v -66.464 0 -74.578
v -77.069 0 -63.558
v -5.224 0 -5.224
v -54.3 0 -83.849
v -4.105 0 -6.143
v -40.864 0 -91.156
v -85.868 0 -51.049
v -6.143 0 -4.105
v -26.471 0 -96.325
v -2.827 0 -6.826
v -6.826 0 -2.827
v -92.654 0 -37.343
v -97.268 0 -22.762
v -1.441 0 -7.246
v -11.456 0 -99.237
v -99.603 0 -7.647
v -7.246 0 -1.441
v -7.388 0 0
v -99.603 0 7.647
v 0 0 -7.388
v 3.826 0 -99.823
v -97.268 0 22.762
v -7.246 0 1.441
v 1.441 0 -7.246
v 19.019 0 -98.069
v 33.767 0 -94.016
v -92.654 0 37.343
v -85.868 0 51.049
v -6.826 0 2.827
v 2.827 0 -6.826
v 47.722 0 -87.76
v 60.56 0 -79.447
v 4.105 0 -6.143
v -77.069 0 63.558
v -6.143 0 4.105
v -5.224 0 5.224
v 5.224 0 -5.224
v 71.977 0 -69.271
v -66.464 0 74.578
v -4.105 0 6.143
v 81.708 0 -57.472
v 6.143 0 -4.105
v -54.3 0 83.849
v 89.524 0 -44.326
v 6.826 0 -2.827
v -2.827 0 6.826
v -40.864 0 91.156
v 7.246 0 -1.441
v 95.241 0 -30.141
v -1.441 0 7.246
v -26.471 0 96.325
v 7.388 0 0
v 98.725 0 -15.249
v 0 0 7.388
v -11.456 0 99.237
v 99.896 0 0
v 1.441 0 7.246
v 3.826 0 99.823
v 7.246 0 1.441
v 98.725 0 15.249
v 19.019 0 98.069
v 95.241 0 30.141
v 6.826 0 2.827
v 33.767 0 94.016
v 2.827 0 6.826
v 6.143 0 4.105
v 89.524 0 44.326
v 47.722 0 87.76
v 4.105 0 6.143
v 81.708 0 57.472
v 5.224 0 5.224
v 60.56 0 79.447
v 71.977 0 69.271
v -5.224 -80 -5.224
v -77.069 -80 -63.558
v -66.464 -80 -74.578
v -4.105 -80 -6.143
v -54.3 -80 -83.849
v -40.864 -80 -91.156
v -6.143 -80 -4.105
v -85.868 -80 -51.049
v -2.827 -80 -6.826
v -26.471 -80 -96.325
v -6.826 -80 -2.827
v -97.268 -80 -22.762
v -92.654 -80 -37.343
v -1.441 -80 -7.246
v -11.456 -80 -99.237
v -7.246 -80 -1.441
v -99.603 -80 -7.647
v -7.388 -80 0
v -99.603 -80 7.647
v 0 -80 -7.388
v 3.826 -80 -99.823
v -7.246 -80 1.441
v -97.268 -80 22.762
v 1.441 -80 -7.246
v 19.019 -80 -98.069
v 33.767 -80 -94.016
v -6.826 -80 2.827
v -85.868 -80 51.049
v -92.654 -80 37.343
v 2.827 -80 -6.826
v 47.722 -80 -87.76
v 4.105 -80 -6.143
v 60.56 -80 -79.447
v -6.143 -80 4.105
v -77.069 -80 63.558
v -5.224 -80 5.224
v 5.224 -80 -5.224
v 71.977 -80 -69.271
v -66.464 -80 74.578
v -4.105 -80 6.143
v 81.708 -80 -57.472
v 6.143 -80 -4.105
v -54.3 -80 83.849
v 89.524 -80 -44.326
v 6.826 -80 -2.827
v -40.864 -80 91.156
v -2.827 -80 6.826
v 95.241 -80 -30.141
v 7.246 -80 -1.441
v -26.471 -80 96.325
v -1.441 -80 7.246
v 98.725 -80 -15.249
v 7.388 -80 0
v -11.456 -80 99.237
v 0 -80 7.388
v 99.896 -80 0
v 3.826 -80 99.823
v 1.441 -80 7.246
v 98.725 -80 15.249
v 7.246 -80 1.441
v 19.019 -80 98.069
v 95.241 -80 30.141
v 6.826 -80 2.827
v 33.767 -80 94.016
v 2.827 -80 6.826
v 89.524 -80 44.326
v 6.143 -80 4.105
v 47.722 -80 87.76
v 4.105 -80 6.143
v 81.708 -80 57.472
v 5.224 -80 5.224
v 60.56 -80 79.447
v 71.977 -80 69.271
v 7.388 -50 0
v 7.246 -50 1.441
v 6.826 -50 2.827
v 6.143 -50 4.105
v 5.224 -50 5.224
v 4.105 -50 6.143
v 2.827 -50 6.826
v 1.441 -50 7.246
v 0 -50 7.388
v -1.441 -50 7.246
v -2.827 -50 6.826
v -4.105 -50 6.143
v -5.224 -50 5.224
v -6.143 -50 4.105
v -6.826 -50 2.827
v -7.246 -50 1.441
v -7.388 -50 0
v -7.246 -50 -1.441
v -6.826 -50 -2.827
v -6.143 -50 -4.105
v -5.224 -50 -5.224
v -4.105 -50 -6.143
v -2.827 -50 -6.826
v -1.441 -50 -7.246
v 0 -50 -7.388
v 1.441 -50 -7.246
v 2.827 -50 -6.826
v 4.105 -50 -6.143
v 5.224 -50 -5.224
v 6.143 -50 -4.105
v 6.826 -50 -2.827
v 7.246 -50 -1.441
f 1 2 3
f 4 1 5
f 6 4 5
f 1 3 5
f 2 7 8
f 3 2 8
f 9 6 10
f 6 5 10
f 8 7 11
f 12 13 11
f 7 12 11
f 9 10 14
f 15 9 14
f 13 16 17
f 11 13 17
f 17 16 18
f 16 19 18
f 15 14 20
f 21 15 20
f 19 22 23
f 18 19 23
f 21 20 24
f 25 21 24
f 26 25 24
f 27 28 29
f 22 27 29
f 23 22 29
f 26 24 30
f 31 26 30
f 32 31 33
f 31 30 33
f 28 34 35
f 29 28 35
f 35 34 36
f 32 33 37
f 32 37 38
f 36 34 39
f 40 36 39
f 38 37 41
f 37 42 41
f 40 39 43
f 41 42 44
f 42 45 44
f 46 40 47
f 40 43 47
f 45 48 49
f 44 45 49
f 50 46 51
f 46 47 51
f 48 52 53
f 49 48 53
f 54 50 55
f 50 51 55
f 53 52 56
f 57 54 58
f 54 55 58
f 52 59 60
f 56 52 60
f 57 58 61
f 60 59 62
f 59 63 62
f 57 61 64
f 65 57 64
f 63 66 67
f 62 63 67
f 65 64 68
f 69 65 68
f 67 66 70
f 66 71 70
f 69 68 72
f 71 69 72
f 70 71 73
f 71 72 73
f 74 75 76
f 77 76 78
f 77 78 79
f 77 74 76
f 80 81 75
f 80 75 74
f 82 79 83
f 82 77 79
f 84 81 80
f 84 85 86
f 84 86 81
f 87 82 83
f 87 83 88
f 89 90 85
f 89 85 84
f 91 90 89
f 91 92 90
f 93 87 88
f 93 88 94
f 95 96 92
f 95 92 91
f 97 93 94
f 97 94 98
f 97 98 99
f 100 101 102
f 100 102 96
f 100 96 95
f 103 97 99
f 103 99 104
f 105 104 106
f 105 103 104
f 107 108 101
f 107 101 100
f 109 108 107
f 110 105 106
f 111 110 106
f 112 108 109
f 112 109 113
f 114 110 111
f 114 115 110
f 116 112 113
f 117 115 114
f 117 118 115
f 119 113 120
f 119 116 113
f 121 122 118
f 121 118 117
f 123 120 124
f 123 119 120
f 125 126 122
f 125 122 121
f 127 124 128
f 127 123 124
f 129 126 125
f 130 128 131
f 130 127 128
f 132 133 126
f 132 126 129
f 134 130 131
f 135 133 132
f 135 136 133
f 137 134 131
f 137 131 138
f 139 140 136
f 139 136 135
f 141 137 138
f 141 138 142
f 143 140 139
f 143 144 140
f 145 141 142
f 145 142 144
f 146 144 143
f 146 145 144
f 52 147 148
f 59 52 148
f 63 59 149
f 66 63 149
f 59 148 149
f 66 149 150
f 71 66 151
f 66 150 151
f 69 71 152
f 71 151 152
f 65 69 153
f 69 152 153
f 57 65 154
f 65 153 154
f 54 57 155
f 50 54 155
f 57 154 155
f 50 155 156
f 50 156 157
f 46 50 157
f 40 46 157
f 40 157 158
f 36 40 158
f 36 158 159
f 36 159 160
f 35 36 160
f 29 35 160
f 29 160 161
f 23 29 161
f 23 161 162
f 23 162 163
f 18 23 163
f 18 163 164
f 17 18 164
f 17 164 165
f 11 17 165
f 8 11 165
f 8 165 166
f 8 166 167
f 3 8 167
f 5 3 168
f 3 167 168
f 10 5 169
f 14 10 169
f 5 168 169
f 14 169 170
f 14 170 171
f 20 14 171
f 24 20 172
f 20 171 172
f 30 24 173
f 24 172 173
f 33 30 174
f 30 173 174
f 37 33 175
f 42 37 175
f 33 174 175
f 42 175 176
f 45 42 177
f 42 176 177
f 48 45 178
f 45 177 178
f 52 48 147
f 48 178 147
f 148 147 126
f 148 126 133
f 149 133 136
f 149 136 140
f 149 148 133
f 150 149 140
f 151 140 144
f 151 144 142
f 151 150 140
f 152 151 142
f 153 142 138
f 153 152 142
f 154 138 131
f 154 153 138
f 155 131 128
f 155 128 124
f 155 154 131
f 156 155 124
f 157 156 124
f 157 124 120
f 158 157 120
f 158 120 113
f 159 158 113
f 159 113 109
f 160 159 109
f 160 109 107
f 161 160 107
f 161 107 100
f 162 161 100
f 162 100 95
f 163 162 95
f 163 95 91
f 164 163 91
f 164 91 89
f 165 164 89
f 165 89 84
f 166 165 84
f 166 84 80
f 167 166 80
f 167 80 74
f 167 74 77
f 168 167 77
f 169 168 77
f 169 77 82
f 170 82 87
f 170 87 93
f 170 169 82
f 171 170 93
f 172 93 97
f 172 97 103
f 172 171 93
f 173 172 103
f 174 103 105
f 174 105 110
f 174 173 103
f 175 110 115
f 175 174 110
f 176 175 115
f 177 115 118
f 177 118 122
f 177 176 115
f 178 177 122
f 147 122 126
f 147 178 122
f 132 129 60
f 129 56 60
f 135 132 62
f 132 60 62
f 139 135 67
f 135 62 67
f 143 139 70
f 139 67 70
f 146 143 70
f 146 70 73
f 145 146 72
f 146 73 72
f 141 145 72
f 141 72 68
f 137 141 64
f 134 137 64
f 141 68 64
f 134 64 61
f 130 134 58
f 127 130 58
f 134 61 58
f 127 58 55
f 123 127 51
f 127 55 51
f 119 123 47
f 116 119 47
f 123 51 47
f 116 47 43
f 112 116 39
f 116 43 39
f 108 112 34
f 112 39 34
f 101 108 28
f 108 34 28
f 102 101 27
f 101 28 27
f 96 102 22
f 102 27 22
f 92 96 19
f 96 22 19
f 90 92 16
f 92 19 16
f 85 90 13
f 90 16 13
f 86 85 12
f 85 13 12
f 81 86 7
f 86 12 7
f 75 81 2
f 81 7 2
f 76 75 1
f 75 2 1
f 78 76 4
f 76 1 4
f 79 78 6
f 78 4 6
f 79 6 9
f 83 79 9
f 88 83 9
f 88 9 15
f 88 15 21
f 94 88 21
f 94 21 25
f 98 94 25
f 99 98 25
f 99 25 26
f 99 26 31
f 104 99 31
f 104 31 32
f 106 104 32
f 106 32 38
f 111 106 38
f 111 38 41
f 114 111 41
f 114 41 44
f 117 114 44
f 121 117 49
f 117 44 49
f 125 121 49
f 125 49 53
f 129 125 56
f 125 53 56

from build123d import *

# Parameters (mm, degrees)
F0_R     = 99.8962025771
F1_DEPTH = 50
F2_R     = 7.3881969702
F3_DEPTH = 50.001
F4_DEPTH = 50
F5_DEPTH = 20


with BuildPart() as f1:
    # F0 (on Front) → F1 (new body)
    with BuildSketch(Plane.XZ):
        Circle(F0_R)
    extrude(amount=F1_DEPTH)

    # F2 (on face) → F3 (cut, through all)
    with BuildSketch(Plane.XZ.offset(50)):
        Circle(F2_R)
    extrude(amount=-F3_DEPTH, mode=Mode.SUBTRACT)

    # F4 (add): a face of the model
    f4_faces = [f1.faces().sort_by_distance(p)[0] for p in [
        (-97.0707112869, -50, 0),
    ]]
    extrude(f4_faces, amount=F4_DEPTH)

    # F5 (cut): a face of the model
    f5_faces = [f1.faces().sort_by_distance(p)[0] for p in [
        (-97.0707112869, -100, 0),
    ]]
    extrude(f5_faces, amount=-F5_DEPTH, mode=Mode.SUBTRACT)


solid = f1.part
